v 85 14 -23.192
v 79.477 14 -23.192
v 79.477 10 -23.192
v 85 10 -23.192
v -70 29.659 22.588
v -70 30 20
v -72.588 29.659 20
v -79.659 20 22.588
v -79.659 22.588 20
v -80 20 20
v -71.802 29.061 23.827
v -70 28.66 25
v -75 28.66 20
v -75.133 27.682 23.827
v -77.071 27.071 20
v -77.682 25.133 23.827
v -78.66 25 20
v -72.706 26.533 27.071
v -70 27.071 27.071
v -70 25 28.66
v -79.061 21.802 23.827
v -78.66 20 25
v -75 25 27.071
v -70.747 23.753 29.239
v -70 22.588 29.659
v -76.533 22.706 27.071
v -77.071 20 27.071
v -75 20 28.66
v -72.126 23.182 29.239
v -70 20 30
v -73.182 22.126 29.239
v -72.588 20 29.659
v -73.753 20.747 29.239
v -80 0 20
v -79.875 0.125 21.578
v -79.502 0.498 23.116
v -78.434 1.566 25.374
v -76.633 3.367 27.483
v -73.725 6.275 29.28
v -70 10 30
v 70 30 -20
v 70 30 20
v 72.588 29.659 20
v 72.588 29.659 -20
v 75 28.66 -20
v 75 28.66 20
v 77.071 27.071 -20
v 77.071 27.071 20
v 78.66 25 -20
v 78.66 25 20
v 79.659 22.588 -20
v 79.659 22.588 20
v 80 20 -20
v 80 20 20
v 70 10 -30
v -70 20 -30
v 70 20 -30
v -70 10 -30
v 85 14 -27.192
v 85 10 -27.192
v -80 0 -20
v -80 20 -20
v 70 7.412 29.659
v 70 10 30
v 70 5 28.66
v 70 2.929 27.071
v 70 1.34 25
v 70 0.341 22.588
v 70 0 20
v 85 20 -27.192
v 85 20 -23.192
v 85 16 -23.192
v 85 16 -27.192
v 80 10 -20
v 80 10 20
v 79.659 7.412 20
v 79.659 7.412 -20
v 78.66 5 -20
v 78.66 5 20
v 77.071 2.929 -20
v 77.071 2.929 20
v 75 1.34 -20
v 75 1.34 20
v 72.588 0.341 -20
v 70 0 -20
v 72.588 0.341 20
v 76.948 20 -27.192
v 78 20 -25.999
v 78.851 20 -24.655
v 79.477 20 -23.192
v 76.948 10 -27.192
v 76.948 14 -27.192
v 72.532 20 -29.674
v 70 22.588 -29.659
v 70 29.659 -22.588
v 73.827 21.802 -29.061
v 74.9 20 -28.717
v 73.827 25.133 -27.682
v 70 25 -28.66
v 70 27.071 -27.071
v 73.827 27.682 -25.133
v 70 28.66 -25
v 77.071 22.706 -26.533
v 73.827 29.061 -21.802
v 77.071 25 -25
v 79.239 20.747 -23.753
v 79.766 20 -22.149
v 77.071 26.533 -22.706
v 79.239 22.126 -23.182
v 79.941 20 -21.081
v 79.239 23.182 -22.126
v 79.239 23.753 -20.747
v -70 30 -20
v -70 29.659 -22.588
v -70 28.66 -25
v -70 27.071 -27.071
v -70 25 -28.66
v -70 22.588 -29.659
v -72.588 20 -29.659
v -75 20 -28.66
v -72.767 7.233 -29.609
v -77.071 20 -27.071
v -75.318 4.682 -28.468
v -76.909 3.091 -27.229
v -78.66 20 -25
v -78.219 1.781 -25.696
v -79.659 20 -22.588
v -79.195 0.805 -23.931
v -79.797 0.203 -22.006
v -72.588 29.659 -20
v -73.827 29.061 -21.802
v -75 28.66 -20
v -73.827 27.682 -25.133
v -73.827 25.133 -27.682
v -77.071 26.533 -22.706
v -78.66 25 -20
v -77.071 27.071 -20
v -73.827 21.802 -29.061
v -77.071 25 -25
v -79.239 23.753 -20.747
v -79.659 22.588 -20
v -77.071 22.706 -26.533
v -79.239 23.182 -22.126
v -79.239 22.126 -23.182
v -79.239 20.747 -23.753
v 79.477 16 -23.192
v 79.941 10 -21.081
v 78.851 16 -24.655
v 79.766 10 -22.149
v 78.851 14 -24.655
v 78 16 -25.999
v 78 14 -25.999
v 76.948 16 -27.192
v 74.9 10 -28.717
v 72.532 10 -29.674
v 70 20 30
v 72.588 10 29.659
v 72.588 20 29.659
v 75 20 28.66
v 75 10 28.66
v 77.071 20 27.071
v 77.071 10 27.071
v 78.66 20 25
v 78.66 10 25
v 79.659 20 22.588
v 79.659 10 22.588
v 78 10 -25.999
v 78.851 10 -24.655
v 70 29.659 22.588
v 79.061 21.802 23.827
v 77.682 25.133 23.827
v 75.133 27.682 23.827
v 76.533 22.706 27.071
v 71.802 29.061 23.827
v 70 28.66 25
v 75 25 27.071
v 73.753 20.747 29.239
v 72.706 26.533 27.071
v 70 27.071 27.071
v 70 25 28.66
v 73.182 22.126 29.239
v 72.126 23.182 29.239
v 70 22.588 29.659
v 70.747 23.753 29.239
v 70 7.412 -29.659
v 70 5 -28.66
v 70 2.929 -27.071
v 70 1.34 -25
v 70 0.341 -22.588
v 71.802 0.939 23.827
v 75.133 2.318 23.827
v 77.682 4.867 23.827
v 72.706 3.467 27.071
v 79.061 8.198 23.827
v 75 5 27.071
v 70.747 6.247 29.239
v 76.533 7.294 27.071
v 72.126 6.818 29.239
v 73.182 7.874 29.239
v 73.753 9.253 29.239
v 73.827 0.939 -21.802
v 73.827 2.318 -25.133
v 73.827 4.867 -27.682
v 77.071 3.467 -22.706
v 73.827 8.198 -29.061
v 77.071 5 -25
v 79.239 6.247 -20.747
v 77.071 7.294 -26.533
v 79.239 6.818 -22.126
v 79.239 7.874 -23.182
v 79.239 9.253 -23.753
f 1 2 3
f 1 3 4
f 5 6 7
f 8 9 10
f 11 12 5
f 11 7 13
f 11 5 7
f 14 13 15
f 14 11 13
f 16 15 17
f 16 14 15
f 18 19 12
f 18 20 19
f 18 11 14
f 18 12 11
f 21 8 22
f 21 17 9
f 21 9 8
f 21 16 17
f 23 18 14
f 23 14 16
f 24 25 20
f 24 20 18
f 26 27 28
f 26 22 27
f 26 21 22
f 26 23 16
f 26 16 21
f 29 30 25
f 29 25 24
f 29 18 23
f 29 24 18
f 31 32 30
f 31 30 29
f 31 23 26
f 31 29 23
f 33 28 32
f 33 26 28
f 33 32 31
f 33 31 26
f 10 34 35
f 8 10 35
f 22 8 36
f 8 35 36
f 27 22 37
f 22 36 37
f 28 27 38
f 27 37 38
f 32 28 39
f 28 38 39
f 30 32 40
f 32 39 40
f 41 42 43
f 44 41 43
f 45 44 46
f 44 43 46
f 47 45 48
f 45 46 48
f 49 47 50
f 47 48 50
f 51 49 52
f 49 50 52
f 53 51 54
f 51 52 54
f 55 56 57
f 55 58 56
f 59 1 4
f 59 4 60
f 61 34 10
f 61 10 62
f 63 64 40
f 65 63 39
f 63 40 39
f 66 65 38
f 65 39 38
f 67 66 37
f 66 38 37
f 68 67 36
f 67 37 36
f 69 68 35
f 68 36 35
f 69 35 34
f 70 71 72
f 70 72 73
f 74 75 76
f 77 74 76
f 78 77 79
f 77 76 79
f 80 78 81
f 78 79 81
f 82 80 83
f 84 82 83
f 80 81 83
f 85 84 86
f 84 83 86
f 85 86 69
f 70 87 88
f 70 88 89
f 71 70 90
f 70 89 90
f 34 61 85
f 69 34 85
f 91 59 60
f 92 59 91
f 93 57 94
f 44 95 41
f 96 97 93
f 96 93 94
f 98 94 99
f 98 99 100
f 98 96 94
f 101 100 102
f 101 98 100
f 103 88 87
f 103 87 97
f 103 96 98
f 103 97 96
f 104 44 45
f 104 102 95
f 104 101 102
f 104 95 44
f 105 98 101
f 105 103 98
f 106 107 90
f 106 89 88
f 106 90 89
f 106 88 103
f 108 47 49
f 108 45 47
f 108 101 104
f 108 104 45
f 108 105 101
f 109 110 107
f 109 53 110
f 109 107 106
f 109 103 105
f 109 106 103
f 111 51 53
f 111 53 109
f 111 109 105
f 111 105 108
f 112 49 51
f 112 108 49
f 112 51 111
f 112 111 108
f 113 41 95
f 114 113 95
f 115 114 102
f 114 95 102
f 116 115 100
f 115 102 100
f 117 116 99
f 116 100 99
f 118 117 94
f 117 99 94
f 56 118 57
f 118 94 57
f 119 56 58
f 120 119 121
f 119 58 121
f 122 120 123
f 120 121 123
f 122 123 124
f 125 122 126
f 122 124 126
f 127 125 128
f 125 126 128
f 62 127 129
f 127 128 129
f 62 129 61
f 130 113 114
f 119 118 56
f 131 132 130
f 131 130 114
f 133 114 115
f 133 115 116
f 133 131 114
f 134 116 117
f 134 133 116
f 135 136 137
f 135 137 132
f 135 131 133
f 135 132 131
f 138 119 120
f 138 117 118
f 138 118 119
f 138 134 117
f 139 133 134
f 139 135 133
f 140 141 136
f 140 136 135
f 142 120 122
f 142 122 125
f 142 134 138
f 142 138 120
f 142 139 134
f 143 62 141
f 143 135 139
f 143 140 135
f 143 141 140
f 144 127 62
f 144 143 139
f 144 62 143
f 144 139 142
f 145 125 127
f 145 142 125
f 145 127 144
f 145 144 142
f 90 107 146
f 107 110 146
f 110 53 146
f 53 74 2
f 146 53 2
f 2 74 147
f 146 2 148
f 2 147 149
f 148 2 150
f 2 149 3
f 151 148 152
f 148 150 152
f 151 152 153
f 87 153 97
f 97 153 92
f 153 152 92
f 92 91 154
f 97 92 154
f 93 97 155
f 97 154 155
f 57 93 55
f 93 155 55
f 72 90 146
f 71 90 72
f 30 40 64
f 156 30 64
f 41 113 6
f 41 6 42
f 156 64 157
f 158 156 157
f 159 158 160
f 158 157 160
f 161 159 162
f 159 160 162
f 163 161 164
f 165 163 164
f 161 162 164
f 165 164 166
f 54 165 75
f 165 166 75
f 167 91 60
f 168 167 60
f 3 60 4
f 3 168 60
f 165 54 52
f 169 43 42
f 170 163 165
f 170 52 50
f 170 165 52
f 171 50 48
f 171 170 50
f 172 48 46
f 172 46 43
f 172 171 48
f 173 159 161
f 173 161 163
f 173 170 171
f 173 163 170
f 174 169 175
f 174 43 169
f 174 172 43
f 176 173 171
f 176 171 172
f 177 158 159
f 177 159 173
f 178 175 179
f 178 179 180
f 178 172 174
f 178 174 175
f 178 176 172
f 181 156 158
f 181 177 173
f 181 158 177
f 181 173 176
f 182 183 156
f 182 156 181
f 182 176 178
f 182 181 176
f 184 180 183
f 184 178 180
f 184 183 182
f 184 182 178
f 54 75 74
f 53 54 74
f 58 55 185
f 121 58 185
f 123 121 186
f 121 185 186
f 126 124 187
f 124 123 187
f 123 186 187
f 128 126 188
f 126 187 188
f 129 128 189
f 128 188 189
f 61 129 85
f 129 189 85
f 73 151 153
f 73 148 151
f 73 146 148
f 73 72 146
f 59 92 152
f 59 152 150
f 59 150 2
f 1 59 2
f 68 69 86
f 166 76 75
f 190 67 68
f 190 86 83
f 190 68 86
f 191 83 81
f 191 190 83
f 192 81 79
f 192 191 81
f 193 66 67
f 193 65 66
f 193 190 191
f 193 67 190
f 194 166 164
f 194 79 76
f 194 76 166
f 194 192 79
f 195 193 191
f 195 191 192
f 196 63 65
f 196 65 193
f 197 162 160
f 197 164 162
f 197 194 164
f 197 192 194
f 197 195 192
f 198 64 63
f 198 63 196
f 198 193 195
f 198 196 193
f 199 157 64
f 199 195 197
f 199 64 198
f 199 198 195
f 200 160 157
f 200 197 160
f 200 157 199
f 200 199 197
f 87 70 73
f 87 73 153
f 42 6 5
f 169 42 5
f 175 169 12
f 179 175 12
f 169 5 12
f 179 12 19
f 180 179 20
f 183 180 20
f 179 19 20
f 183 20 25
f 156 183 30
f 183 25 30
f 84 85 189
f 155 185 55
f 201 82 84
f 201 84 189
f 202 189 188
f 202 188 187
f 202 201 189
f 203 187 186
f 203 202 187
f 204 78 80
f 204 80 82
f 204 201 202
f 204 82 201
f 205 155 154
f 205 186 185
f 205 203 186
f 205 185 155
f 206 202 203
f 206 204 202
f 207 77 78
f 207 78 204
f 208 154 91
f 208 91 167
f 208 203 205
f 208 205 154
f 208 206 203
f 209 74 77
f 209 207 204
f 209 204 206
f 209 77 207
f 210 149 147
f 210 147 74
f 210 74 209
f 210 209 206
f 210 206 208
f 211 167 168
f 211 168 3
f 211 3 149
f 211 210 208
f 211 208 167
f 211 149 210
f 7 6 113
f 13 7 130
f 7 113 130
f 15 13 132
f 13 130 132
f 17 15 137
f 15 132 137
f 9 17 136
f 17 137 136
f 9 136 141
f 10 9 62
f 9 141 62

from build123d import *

# Parameters (mm, degrees)
ESQUISSE1_W        = 160
ESQUISSE1_H        = 60
BOSS_EXTRU_1_DEPTH = 30
ESQUISSE2_W        = 4
ESQUISSE2_H        = 4
BOSS_EXTRU_2_DEPTH = 5
CONG_1_R           = 10


with BuildPart() as part:
    # Esquisse1 → Boss.-Extru.1 (new body)
    with BuildSketch(Plane(origin=(0, 0, 0), x_dir=(1, 0, 0), z_dir=(0, 1, 0))):
        Rectangle(ESQUISSE1_W, ESQUISSE1_H)
    extrude(amount=BOSS_EXTRU_1_DEPTH)

    # Esquisse2 → Boss.-Extru.2 (add)
    with BuildSketch(Plane(origin=(80, 0, 0), x_dir=(0, 0, -1), z_dir=(1, 0, 0))):
        with Locations((25.192260315, 18)):
            Rectangle(ESQUISSE2_W, ESQUISSE2_H)
        with Locations((25.192260315, 12)):
            Rectangle(ESQUISSE2_W, ESQUISSE2_H)
    extrude(amount=BOSS_EXTRU_2_DEPTH)

    # Congé1
    # the kernel refuses this fillet: 10 mm, written as the material it takes off along each edge
    with BuildSketch(Plane(origin=(-70, 20, 20), x_dir=(-1, 0, 0), z_dir=(0, 0, 1))) as cong_1_piece_1_section:
        Polygon((0, 0), (CONG_1_R * 1.02, 0), (CONG_1_R * 1.02, -CONG_1_R * 1.02), (0, -CONG_1_R * 1.02), align=None)
    cong_1_piece_1 = extrude(amount=CONG_1_R * 1.02, mode=Mode.PRIVATE)
    cong_1_piece_1 = cong_1_piece_1 - Plane(origin=(-70, 20, 20), x_dir=(0.7071067811865475, -0.7071067811865475, 0), z_dir=(0, 0, 1)) * Sphere(CONG_1_R, mode=Mode.PRIVATE)
    add(cong_1_piece_1, mode=Mode.SUBTRACT)
    with BuildSketch(Plane(origin=(-70, 20, -20), x_dir=(0, 1, 0), z_dir=(-1, 0, 0))) as cong_1_piece_2_section:
        Polygon((0, 0), (CONG_1_R * 1.02, 0), (CONG_1_R * 1.02, CONG_1_R * 1.02), (0, CONG_1_R * 1.02), align=None)
    cong_1_piece_2 = extrude(amount=CONG_1_R * 1.02, mode=Mode.PRIVATE)
    cong_1_piece_2 = cong_1_piece_2 - Plane(origin=(-70, 20, -20), x_dir=(0, -0.7071067811865475, 0.7071067811865475), z_dir=(-1, 0, 0)) * Sphere(CONG_1_R, mode=Mode.PRIVATE)
    add(cong_1_piece_2, mode=Mode.SUBTRACT)
    with BuildSketch(Plane(origin=(70, 10, -20), x_dir=(0, -1, 0), z_dir=(1, 0, 0))) as cong_1_piece_3_section:
        Polygon((0, 0), (CONG_1_R * 1.02, 0), (CONG_1_R * 1.02, CONG_1_R * 1.02), (0, CONG_1_R * 1.02), align=None)
    cong_1_piece_3 = extrude(amount=CONG_1_R * 1.02, mode=Mode.PRIVATE)
    cong_1_piece_3 = cong_1_piece_3 - Plane(origin=(70, 10, -20), x_dir=(0, 0.7071067811865475, 0.7071067811865475), z_dir=(1, 0, 0)) * Sphere(CONG_1_R, mode=Mode.PRIVATE)
    add(cong_1_piece_3, mode=Mode.SUBTRACT)
    with BuildSketch(Plane(origin=(70, 20, -20), x_dir=(0, 1, 0), z_dir=(1, 0, 0))) as cong_1_piece_4_section:
        Polygon((0, 0), (CONG_1_R * 1.02, 0), (CONG_1_R * 1.02, -CONG_1_R * 1.02), (0, -CONG_1_R * 1.02), align=None)
    cong_1_piece_4 = extrude(amount=CONG_1_R * 1.02, mode=Mode.PRIVATE)
    cong_1_piece_4 = cong_1_piece_4 - Plane(origin=(70, 20, -20), x_dir=(0, -0.7071067811865475, 0.7071067811865475), z_dir=(1, 0, 0)) * Sphere(CONG_1_R, mode=Mode.PRIVATE)
    add(cong_1_piece_4, mode=Mode.SUBTRACT)
    with BuildSketch(Plane(origin=(70, 10, 20), x_dir=(1, 0, 0), z_dir=(0, 0, 1))) as cong_1_piece_5_section:
        Polygon((0, 0), (CONG_1_R * 1.02, 0), (CONG_1_R * 1.02, -CONG_1_R * 1.02), (0, -CONG_1_R * 1.02), align=None)
    cong_1_piece_5 = extrude(amount=CONG_1_R * 1.02, mode=Mode.PRIVATE)
    cong_1_piece_5 = cong_1_piece_5 - Plane(origin=(70, 10, 20), x_dir=(-0.7071067811865475, 0.7071067811865475, 0), z_dir=(0, 0, 1)) * Sphere(CONG_1_R, mode=Mode.PRIVATE)
    add(cong_1_piece_5, mode=Mode.SUBTRACT)
    with BuildSketch(Plane(origin=(70, 20, 20), x_dir=(1, 0, 0), z_dir=(0, 0, 1))) as cong_1_piece_6_section:
        Polygon((0, 0), (CONG_1_R * 1.02, 0), (CONG_1_R * 1.02, CONG_1_R * 1.02), (0, CONG_1_R * 1.02), align=None)
    cong_1_piece_6 = extrude(amount=CONG_1_R * 1.02, mode=Mode.PRIVATE)
    cong_1_piece_6 = cong_1_piece_6 - Plane(origin=(70, 20, 20), x_dir=(-0.7071067811865475, -0.7071067811865475, 0), z_dir=(0, 0, 1)) * Sphere(CONG_1_R, mode=Mode.PRIVATE)
    add(cong_1_piece_6, mode=Mode.SUBTRACT)
    with BuildSketch(Plane(origin=(-80, -25, 30), x_dir=(1, 0, 0), z_dir=(0, 1, 0)), Plane(origin=(-80, -25, -30), x_dir=(0, 0, 1), z_dir=(0, 1, 0))) as cong_1_piece_7:
        with BuildLine():
            CenterArc((CONG_1_R, CONG_1_R), CONG_1_R, 180, 90)
            Line((0, CONG_1_R), (0, 0))
            Line((0, 0), (CONG_1_R, 0))
        make_face()
    extrude(amount=45, mode=Mode.SUBTRACT)
    with BuildSketch(Plane(origin=(70, 0, -30), x_dir=(0, 0, 1), z_dir=(-1, 0, 0))) as cong_1_piece_8:
        with BuildLine():
            CenterArc((CONG_1_R, CONG_1_R), CONG_1_R, 180, 90)
            Line((0, CONG_1_R), (0, 0))
            Line((0, 0), (CONG_1_R, 0))
        make_face()
    extrude(amount=175, mode=Mode.SUBTRACT)
    with BuildSketch(Plane(origin=(80, 10, -30), x_dir=(0, 0, 1), z_dir=(0, 1, 0))) as cong_1_piece_9_section:
        with BuildLine():
            CenterArc((CONG_1_R, -CONG_1_R), CONG_1_R, 90, 90)
            Line((0, -CONG_1_R), (0, 0))
            Line((0, 0), (CONG_1_R, 0))
        make_face()
    cong_1_piece_9 = extrude(amount=10, mode=Mode.PRIVATE)
    cong_1_piece_9 = split(cong_1_piece_9, bisect_by=Plane(origin=(79.843765754, 12, -23.192260315), z_dir=(0, 0, 1)), keep=Keep.TOP, mode=Mode.PRIVATE)
    add(cong_1_piece_9, mode=Mode.SUBTRACT)
    with BuildSketch(Plane(origin=(80, 10, -30), x_dir=(0, 0, 1), z_dir=(0, 1, 0))) as cong_1_piece_10_section:
        with BuildLine():
            CenterArc((CONG_1_R, -CONG_1_R), CONG_1_R, 90, 90)
            Line((0, -CONG_1_R), (0, 0))
            Line((0, 0), (CONG_1_R, 0))
        make_face()
    cong_1_piece_10 = extrude(amount=10, mode=Mode.PRIVATE)
    cong_1_piece_10 = split(cong_1_piece_10, bisect_by=Plane(origin=(77.140541655, 12, -27.192260315), z_dir=(0, 0, -1)), keep=Keep.TOP, mode=Mode.PRIVATE)
    add(cong_1_piece_10, mode=Mode.SUBTRACT)
    with BuildSketch(Plane(origin=(80, 10, -30), x_dir=(0, 0, 1), z_dir=(0, 1, 0))) as cong_1_piece_11_section:
        with BuildLine():
            CenterArc((CONG_1_R, -CONG_1_R), CONG_1_R, 90, 90)
            Line((0, -CONG_1_R), (0, 0))
            Line((0, 0), (CONG_1_R, 0))
        make_face()
    cong_1_piece_11 = extrude(amount=10, mode=Mode.PRIVATE)
    cong_1_piece_11 = split(cong_1_piece_11, bisect_by=Plane(origin=(79.050284637, 16, -25.722845845), z_dir=(0, -1, 0)), keep=Keep.TOP, mode=Mode.PRIVATE)
    cong_1_piece_11 = split(cong_1_piece_11, bisect_by=Plane(origin=(79.050284637, 14, -25.722845845), z_dir=(0, 1, 0)), keep=Keep.TOP, mode=Mode.PRIVATE)
    add(cong_1_piece_11, mode=Mode.SUBTRACT)
    with BuildSketch(Plane(origin=(80, 0, 20), x_dir=(0, 1, 0), z_dir=(0, 0, -1))) as cong_1_piece_12:
        with BuildLine():
            CenterArc((CONG_1_R, -CONG_1_R), CONG_1_R, 90, 90)
            Line((0, -CONG_1_R), (0, 0))
            Line((0, 0), (CONG_1_R, 0))
        make_face()
    extrude(amount=40, mode=Mode.SUBTRACT)
    with BuildSketch(Plane(origin=(80, 30, 20), x_dir=(0, -1, 0), z_dir=(0, 0, -1)), Plane(origin=(-80, 30, -20), x_dir=(0, -1, 0), z_dir=(0, 0, 1))) as cong_1_piece_13:
        with BuildLine():
            CenterArc((CONG_1_R, CONG_1_R), CONG_1_R, 180, 90)
            Line((0, CONG_1_R), (0, 0))
            Line((0, 0), (CONG_1_R, 0))
        make_face()
    extrude(amount=40, mode=Mode.SUBTRACT)
    with BuildSketch(Plane(origin=(70, 30, -30), x_dir=(0, 0, 1), z_dir=(-1, 0, 0))) as cong_1_piece_14:
        with BuildLine():
            CenterArc((CONG_1_R, -CONG_1_R), CONG_1_R, 90, 90)
            Line((0, -CONG_1_R), (0, 0))
            Line((0, 0), (CONG_1_R, 0))
        make_face()
    extrude(amount=140, mode=Mode.SUBTRACT)
    with BuildSketch(Plane(origin=(80, 10, 30), x_dir=(-1, 0, 0), z_dir=(0, 1, 0))) as cong_1_piece_15:
        with BuildLine():
            CenterArc((CONG_1_R, -CONG_1_R), CONG_1_R, 90, 90)
            Line((0, -CONG_1_R), (0, 0))
            Line((0, 0), (CONG_1_R, 0))
        make_face()
    extrude(amount=10, mode=Mode.SUBTRACT)
    with BuildSketch(Plane(origin=(-105, 0, 30), x_dir=(0, 1, 0), z_dir=(1, 0, 0))) as cong_1_piece_16:
        with BuildLine():
            CenterArc((CONG_1_R, -CONG_1_R), CONG_1_R, 90, 90)
            Line((0, -CONG_1_R), (0, 0))
            Line((0, 0), (CONG_1_R, 0))
        make_face()
    extrude(amount=175, mode=Mode.SUBTRACT)
    with BuildSketch(Plane(origin=(-70, 30, 30), x_dir=(0, -1, 0), z_dir=(1, 0, 0))) as cong_1_piece_17:
        with BuildLine():
            CenterArc((CONG_1_R, CONG_1_R), CONG_1_R, 180, 90)
            Line((0, CONG_1_R), (0, 0))
            Line((0, 0), (CONG_1_R, 0))
        make_face()
    extrude(amount=140, mode=Mode.SUBTRACT)


solid = part.part
